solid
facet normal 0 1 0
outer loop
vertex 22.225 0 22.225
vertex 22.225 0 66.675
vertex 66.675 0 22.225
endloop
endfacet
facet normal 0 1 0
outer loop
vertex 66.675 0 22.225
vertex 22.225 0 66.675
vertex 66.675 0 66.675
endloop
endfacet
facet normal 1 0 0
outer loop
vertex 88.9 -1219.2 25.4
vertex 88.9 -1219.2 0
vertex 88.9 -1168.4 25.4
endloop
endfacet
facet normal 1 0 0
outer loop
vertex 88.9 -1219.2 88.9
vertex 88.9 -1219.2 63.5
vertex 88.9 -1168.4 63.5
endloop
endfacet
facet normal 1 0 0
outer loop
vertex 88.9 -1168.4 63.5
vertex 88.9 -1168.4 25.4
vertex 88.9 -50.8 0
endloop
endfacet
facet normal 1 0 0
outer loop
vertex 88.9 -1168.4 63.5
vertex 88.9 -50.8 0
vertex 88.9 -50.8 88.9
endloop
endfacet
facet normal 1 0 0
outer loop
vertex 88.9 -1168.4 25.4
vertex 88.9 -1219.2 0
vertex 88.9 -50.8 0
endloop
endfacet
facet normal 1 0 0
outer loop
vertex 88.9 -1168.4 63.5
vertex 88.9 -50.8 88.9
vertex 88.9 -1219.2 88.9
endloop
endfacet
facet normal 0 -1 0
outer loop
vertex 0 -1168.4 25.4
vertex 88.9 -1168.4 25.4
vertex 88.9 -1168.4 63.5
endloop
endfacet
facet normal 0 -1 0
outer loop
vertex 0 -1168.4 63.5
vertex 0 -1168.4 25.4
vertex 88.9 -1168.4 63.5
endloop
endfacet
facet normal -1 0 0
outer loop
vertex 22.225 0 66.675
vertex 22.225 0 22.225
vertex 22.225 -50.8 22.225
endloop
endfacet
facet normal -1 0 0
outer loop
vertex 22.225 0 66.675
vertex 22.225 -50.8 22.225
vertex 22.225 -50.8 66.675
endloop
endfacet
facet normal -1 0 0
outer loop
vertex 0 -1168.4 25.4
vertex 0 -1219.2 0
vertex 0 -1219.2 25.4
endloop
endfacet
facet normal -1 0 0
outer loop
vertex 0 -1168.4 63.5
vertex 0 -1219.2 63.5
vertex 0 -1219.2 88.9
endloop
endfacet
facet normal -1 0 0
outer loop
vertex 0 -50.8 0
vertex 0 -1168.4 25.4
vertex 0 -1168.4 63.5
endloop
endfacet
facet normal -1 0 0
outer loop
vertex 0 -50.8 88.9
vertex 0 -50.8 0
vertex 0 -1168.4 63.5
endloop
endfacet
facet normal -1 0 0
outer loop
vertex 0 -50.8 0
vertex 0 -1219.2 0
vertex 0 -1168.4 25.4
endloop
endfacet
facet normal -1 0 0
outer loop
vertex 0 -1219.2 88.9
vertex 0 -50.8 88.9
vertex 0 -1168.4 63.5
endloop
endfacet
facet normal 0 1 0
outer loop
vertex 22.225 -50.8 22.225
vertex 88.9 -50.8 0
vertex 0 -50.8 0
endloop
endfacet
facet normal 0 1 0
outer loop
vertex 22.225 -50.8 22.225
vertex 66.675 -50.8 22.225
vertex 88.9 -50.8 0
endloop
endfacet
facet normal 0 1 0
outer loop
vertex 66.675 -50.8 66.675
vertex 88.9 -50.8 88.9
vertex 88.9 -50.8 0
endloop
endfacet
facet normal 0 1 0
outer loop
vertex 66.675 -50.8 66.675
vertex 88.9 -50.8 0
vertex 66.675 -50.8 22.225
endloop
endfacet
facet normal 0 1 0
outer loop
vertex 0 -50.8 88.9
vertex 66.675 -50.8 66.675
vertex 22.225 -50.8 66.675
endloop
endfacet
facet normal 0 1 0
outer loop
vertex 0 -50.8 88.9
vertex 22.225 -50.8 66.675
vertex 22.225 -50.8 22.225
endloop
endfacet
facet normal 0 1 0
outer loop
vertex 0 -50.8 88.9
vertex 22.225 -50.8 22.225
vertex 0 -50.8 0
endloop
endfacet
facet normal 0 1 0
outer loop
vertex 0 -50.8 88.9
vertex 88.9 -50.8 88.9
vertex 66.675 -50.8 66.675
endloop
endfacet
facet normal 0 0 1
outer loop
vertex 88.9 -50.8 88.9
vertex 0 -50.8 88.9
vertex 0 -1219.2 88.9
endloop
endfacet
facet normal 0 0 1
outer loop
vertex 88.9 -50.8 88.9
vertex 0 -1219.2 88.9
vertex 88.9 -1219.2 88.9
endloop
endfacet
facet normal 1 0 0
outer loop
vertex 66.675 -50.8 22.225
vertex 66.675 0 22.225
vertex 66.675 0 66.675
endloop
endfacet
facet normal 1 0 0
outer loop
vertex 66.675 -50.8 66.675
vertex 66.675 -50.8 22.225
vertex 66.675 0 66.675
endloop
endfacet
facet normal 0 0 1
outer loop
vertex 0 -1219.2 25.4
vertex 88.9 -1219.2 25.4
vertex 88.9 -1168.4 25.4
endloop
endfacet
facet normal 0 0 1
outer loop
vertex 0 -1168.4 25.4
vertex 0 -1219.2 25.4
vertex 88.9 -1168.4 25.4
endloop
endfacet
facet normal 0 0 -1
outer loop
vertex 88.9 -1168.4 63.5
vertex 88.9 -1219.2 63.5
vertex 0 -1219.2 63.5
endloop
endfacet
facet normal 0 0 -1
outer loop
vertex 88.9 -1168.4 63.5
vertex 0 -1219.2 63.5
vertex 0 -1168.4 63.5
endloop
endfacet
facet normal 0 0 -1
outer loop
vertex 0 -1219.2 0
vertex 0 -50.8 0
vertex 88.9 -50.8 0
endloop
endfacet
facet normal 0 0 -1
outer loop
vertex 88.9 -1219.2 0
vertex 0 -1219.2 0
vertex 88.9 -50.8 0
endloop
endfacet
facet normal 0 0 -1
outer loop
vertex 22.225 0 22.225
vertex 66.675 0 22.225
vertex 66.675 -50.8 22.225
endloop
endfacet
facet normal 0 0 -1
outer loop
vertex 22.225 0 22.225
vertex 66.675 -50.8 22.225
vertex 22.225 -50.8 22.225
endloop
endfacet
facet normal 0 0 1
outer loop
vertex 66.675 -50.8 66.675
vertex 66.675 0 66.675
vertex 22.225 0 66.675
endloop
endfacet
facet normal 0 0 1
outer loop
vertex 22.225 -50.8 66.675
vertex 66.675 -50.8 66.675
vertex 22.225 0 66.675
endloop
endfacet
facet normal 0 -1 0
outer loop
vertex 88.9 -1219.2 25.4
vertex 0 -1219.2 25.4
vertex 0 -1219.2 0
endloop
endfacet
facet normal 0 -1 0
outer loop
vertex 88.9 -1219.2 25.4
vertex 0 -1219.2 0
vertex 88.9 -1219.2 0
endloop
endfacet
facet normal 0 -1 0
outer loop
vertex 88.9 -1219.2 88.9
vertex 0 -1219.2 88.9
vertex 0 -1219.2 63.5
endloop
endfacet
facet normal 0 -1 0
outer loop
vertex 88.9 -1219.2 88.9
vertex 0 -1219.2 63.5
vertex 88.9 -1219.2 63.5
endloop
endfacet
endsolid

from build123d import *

# Parameters (mm, degrees)
F0_W     = 88.9
F0_H     = 88.9
F1_DEPTH = 1219.2
F2_W     = 50.8
F2_H     = 38.1
F3_DEPTH = 101.6
F4_W     = 88.9
F4_H     = 88.9
F4_W_2   = 44.45
F4_H_2   = 44.45
F5_DEPTH = 50.8


with BuildPart() as f1:
    # F0 (on Front) → F1 (new body)
    with BuildSketch(Plane.XZ):
        with Locations((44.45, 44.45)):
            Rectangle(F0_W, F0_H)
    extrude(amount=F1_DEPTH)

    # F2 (on face) → F3 (cut)
    with BuildSketch(Plane.YZ.offset(88.9)):
        with Locations((-1193.8, 44.45)):
            Rectangle(F2_W, F2_H)
    extrude(amount=-F3_DEPTH, mode=Mode.SUBTRACT)

    # F4 (on face) → F5 (cut)
    with BuildSketch(Plane(origin=(0, 0, 0), x_dir=(-1, 0, 0), z_dir=(0, 1, 0))):
        with Locations((-44.45, 44.45)):
            Rectangle(F4_W, F4_H)
        with Locations((-44.45, 44.45)):
            Rectangle(F4_W_2, F4_H_2, mode=Mode.SUBTRACT)
    extrude(amount=-F5_DEPTH, mode=Mode.SUBTRACT)


solid = f1.part
